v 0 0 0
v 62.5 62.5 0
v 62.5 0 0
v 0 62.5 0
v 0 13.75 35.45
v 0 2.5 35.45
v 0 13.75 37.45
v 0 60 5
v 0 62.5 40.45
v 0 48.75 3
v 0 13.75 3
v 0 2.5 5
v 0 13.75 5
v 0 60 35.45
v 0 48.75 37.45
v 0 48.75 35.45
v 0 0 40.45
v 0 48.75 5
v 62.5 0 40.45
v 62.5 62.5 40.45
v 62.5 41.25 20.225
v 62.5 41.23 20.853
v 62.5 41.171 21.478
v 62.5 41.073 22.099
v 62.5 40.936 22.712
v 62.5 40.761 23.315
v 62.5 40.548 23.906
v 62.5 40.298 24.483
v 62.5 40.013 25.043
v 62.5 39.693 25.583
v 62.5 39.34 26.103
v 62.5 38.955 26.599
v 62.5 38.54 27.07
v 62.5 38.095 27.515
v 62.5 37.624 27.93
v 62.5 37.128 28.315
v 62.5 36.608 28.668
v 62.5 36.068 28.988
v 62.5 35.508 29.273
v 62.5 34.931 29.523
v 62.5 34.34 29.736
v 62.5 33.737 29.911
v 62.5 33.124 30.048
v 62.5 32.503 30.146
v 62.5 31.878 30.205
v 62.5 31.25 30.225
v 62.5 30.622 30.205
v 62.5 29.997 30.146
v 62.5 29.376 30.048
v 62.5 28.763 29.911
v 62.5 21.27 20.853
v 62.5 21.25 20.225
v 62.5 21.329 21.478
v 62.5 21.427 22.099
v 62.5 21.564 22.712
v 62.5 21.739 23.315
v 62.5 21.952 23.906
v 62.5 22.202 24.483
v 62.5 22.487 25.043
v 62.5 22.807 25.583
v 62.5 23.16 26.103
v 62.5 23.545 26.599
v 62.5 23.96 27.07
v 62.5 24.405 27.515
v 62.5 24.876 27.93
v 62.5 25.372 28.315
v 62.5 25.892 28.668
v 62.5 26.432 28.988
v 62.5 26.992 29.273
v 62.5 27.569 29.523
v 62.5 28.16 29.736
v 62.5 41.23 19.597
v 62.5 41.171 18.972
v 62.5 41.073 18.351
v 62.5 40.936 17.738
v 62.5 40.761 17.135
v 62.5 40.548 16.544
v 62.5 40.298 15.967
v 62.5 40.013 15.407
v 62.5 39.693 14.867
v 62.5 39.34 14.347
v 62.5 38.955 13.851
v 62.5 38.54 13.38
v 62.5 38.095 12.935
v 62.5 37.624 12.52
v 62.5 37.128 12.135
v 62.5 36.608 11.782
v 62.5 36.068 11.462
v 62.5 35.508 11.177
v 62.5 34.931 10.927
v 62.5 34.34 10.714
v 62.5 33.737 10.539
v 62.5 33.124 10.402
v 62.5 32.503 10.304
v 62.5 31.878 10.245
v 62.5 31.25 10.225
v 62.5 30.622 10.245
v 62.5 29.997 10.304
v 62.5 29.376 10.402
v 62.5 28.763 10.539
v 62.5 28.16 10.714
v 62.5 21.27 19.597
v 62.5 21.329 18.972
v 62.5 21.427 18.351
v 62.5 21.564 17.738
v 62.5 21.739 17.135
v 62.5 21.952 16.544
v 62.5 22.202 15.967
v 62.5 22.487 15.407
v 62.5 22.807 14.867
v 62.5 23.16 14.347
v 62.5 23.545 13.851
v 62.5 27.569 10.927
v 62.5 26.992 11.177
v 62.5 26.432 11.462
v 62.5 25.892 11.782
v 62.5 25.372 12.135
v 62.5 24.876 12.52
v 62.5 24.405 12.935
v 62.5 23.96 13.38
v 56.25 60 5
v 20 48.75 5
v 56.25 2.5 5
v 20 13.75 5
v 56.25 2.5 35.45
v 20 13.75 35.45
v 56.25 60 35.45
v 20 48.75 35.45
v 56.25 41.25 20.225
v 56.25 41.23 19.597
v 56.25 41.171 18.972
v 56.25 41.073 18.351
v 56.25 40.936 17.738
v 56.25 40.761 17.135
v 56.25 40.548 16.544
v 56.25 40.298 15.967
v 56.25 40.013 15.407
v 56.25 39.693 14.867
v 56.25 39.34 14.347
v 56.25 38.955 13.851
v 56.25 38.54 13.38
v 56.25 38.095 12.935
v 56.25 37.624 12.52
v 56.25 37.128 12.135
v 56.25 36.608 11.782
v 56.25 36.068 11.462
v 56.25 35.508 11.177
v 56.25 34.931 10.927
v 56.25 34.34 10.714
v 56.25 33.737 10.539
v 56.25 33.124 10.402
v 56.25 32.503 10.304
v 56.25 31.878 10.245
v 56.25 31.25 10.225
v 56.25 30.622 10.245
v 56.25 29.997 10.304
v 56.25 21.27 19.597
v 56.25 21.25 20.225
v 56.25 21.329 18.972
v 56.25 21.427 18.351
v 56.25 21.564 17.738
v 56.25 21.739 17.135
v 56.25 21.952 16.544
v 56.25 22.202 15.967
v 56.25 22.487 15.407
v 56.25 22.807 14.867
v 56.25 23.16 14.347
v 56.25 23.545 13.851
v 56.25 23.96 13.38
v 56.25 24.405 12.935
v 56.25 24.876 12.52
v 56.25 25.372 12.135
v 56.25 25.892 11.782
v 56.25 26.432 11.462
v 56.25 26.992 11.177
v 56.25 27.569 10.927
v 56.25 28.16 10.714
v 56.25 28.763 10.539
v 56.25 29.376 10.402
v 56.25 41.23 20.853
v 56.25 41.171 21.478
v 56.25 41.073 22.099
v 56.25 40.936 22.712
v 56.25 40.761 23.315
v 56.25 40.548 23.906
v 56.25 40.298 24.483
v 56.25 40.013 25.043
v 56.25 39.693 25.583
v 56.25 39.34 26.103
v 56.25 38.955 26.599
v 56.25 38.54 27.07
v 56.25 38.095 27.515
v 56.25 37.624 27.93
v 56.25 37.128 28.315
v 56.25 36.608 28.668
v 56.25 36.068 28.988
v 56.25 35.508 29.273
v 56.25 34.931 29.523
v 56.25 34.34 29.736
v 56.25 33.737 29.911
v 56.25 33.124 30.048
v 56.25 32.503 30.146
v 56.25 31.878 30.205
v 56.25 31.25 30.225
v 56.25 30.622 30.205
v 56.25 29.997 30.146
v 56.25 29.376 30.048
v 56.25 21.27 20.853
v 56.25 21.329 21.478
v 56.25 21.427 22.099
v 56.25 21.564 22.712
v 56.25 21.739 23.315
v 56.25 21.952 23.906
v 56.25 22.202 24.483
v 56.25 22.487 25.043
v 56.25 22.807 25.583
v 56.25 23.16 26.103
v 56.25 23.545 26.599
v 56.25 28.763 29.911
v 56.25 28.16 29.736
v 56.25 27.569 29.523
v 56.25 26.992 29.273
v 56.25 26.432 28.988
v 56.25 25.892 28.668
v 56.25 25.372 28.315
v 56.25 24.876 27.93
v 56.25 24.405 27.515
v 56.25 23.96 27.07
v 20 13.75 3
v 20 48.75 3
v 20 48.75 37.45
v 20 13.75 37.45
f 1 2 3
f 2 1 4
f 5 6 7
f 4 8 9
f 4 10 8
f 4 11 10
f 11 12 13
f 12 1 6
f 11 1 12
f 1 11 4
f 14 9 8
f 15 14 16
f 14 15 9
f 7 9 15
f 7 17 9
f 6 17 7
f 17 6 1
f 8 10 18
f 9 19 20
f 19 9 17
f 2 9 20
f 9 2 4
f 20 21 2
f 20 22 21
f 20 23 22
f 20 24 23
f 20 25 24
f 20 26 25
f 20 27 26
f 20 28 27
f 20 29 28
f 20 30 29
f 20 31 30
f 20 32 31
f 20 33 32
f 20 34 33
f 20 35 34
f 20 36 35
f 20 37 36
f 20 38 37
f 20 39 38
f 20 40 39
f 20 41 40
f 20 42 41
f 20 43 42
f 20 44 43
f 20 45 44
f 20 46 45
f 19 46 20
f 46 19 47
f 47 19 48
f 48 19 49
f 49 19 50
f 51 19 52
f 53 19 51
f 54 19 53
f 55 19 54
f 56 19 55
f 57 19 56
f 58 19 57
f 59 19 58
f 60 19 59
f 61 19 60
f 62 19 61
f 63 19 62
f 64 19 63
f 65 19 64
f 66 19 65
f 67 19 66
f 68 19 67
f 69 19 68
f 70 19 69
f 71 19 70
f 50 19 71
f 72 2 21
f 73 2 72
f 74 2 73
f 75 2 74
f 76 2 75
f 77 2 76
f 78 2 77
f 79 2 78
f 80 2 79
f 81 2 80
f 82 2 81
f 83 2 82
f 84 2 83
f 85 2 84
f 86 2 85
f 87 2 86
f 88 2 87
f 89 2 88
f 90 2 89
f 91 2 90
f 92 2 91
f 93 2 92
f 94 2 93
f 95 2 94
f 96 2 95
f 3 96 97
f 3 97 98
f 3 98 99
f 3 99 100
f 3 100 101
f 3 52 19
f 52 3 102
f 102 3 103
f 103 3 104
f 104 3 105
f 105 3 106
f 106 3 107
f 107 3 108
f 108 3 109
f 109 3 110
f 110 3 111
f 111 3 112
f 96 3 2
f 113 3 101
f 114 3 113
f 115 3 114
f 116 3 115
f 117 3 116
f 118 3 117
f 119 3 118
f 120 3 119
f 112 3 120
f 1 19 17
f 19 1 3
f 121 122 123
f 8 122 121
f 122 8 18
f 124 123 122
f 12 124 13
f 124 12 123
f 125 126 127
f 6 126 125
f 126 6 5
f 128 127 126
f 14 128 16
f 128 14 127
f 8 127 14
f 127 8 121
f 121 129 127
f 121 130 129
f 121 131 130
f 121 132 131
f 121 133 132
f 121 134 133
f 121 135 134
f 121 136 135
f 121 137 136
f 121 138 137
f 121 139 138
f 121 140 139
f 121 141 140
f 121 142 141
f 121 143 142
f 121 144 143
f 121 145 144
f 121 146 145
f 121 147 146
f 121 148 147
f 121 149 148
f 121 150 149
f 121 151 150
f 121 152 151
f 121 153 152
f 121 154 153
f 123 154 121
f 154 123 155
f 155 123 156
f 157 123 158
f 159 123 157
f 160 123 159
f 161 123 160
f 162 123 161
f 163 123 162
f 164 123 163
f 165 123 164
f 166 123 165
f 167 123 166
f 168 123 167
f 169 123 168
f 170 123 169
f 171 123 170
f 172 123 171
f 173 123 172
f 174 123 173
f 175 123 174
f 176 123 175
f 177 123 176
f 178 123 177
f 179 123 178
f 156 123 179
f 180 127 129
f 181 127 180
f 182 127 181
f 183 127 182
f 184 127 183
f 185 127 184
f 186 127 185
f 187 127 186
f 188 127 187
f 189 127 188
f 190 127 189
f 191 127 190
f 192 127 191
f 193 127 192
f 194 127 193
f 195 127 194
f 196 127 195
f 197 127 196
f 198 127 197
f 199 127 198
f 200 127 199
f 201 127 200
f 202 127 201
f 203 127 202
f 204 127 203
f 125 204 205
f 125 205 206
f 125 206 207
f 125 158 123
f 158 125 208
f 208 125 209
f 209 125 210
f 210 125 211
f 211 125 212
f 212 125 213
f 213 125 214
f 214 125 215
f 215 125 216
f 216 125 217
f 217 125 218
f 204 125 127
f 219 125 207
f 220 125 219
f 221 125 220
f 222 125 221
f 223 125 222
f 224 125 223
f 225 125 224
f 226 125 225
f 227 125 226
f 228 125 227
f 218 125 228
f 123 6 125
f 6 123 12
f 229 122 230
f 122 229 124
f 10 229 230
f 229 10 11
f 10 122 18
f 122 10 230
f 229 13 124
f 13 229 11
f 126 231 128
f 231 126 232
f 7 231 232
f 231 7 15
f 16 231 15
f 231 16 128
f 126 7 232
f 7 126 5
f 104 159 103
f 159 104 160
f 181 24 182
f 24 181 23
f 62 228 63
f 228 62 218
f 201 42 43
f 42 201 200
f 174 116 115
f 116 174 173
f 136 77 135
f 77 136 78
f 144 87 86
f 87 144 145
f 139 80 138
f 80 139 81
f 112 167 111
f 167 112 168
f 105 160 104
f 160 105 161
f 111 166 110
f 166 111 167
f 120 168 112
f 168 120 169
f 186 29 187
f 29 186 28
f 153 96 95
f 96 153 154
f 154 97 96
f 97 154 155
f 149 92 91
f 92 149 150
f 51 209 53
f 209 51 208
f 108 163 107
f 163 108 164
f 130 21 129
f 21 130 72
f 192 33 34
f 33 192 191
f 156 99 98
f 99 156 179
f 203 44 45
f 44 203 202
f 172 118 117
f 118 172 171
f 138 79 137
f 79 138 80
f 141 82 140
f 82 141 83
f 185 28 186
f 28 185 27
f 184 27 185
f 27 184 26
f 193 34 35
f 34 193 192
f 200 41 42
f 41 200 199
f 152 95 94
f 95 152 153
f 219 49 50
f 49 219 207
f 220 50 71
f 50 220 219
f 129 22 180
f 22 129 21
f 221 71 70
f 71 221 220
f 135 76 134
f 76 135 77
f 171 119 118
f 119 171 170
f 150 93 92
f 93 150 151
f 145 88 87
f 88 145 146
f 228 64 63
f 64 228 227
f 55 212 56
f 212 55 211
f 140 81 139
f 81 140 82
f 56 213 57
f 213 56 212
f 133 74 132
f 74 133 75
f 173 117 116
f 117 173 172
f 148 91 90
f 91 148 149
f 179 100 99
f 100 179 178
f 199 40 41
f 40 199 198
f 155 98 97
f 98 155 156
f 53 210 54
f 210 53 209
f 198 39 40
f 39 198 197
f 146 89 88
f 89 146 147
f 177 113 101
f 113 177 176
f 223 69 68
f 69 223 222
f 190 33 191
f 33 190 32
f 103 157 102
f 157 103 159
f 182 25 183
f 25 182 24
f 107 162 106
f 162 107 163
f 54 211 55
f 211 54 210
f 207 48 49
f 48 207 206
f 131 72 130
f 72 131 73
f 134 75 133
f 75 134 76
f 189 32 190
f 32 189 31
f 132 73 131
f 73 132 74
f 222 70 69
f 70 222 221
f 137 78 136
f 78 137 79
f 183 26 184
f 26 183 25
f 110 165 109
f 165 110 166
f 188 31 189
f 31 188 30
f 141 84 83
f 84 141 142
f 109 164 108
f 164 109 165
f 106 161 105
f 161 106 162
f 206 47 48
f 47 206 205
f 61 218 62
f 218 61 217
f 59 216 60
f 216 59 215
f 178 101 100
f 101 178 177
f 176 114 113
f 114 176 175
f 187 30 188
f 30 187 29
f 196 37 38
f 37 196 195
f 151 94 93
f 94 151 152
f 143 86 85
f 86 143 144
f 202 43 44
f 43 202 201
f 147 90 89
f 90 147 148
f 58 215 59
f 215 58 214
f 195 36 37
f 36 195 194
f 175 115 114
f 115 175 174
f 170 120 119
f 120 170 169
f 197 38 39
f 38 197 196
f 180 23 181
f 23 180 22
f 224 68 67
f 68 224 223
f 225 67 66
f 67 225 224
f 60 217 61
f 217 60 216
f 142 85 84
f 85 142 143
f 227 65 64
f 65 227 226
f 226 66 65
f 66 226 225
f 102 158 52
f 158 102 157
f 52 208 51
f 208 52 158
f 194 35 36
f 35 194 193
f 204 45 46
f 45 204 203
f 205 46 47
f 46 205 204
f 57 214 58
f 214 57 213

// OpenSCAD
// for lee valley digital level
$fn=100;

CENTERED=false;

FRONT_WIDE= 57.5;
FRONT_DEEP= 57.5;

HEIGHT_HOLDER = 30.45;


module make_ledbox(extra = 0)
{
    linear_extrude(height = HEIGHT_HOLDER + extra *2)
    {
        square([FRONT_WIDE + extra, FRONT_DEEP + extra], CENTERED);
    }
}

//make_ledbox();
THICK = 5;

// don't press the keys down when put in box
KEY_THICK = 2;
KEY_WIDE = 35;
KEY_DEEP = 20;

difference()
{
    difference()
    {
        difference()
        {
            make_ledbox(THICK);
            translate([-THICK/4, THICK/2, THICK])
            make_ledbox();
        }

        translate([ 0, (FRONT_WIDE + THICK - KEY_WIDE)/2, THICK - KEY_THICK])
        {
            #cube ([ KEY_DEEP, KEY_WIDE, KEY_THICK]);

            translate([ 0, 0, HEIGHT_HOLDER + KEY_THICK])
            #cube ([ KEY_DEEP, KEY_WIDE, KEY_THICK]);
        }
    }
    translate ([0, (FRONT_WIDE + THICK)/2, HEIGHT_HOLDER /2 + THICK])
    rotate([0, 90, 0])
    cylinder(h = FRONT_DEEP *2, d= 20);
}
